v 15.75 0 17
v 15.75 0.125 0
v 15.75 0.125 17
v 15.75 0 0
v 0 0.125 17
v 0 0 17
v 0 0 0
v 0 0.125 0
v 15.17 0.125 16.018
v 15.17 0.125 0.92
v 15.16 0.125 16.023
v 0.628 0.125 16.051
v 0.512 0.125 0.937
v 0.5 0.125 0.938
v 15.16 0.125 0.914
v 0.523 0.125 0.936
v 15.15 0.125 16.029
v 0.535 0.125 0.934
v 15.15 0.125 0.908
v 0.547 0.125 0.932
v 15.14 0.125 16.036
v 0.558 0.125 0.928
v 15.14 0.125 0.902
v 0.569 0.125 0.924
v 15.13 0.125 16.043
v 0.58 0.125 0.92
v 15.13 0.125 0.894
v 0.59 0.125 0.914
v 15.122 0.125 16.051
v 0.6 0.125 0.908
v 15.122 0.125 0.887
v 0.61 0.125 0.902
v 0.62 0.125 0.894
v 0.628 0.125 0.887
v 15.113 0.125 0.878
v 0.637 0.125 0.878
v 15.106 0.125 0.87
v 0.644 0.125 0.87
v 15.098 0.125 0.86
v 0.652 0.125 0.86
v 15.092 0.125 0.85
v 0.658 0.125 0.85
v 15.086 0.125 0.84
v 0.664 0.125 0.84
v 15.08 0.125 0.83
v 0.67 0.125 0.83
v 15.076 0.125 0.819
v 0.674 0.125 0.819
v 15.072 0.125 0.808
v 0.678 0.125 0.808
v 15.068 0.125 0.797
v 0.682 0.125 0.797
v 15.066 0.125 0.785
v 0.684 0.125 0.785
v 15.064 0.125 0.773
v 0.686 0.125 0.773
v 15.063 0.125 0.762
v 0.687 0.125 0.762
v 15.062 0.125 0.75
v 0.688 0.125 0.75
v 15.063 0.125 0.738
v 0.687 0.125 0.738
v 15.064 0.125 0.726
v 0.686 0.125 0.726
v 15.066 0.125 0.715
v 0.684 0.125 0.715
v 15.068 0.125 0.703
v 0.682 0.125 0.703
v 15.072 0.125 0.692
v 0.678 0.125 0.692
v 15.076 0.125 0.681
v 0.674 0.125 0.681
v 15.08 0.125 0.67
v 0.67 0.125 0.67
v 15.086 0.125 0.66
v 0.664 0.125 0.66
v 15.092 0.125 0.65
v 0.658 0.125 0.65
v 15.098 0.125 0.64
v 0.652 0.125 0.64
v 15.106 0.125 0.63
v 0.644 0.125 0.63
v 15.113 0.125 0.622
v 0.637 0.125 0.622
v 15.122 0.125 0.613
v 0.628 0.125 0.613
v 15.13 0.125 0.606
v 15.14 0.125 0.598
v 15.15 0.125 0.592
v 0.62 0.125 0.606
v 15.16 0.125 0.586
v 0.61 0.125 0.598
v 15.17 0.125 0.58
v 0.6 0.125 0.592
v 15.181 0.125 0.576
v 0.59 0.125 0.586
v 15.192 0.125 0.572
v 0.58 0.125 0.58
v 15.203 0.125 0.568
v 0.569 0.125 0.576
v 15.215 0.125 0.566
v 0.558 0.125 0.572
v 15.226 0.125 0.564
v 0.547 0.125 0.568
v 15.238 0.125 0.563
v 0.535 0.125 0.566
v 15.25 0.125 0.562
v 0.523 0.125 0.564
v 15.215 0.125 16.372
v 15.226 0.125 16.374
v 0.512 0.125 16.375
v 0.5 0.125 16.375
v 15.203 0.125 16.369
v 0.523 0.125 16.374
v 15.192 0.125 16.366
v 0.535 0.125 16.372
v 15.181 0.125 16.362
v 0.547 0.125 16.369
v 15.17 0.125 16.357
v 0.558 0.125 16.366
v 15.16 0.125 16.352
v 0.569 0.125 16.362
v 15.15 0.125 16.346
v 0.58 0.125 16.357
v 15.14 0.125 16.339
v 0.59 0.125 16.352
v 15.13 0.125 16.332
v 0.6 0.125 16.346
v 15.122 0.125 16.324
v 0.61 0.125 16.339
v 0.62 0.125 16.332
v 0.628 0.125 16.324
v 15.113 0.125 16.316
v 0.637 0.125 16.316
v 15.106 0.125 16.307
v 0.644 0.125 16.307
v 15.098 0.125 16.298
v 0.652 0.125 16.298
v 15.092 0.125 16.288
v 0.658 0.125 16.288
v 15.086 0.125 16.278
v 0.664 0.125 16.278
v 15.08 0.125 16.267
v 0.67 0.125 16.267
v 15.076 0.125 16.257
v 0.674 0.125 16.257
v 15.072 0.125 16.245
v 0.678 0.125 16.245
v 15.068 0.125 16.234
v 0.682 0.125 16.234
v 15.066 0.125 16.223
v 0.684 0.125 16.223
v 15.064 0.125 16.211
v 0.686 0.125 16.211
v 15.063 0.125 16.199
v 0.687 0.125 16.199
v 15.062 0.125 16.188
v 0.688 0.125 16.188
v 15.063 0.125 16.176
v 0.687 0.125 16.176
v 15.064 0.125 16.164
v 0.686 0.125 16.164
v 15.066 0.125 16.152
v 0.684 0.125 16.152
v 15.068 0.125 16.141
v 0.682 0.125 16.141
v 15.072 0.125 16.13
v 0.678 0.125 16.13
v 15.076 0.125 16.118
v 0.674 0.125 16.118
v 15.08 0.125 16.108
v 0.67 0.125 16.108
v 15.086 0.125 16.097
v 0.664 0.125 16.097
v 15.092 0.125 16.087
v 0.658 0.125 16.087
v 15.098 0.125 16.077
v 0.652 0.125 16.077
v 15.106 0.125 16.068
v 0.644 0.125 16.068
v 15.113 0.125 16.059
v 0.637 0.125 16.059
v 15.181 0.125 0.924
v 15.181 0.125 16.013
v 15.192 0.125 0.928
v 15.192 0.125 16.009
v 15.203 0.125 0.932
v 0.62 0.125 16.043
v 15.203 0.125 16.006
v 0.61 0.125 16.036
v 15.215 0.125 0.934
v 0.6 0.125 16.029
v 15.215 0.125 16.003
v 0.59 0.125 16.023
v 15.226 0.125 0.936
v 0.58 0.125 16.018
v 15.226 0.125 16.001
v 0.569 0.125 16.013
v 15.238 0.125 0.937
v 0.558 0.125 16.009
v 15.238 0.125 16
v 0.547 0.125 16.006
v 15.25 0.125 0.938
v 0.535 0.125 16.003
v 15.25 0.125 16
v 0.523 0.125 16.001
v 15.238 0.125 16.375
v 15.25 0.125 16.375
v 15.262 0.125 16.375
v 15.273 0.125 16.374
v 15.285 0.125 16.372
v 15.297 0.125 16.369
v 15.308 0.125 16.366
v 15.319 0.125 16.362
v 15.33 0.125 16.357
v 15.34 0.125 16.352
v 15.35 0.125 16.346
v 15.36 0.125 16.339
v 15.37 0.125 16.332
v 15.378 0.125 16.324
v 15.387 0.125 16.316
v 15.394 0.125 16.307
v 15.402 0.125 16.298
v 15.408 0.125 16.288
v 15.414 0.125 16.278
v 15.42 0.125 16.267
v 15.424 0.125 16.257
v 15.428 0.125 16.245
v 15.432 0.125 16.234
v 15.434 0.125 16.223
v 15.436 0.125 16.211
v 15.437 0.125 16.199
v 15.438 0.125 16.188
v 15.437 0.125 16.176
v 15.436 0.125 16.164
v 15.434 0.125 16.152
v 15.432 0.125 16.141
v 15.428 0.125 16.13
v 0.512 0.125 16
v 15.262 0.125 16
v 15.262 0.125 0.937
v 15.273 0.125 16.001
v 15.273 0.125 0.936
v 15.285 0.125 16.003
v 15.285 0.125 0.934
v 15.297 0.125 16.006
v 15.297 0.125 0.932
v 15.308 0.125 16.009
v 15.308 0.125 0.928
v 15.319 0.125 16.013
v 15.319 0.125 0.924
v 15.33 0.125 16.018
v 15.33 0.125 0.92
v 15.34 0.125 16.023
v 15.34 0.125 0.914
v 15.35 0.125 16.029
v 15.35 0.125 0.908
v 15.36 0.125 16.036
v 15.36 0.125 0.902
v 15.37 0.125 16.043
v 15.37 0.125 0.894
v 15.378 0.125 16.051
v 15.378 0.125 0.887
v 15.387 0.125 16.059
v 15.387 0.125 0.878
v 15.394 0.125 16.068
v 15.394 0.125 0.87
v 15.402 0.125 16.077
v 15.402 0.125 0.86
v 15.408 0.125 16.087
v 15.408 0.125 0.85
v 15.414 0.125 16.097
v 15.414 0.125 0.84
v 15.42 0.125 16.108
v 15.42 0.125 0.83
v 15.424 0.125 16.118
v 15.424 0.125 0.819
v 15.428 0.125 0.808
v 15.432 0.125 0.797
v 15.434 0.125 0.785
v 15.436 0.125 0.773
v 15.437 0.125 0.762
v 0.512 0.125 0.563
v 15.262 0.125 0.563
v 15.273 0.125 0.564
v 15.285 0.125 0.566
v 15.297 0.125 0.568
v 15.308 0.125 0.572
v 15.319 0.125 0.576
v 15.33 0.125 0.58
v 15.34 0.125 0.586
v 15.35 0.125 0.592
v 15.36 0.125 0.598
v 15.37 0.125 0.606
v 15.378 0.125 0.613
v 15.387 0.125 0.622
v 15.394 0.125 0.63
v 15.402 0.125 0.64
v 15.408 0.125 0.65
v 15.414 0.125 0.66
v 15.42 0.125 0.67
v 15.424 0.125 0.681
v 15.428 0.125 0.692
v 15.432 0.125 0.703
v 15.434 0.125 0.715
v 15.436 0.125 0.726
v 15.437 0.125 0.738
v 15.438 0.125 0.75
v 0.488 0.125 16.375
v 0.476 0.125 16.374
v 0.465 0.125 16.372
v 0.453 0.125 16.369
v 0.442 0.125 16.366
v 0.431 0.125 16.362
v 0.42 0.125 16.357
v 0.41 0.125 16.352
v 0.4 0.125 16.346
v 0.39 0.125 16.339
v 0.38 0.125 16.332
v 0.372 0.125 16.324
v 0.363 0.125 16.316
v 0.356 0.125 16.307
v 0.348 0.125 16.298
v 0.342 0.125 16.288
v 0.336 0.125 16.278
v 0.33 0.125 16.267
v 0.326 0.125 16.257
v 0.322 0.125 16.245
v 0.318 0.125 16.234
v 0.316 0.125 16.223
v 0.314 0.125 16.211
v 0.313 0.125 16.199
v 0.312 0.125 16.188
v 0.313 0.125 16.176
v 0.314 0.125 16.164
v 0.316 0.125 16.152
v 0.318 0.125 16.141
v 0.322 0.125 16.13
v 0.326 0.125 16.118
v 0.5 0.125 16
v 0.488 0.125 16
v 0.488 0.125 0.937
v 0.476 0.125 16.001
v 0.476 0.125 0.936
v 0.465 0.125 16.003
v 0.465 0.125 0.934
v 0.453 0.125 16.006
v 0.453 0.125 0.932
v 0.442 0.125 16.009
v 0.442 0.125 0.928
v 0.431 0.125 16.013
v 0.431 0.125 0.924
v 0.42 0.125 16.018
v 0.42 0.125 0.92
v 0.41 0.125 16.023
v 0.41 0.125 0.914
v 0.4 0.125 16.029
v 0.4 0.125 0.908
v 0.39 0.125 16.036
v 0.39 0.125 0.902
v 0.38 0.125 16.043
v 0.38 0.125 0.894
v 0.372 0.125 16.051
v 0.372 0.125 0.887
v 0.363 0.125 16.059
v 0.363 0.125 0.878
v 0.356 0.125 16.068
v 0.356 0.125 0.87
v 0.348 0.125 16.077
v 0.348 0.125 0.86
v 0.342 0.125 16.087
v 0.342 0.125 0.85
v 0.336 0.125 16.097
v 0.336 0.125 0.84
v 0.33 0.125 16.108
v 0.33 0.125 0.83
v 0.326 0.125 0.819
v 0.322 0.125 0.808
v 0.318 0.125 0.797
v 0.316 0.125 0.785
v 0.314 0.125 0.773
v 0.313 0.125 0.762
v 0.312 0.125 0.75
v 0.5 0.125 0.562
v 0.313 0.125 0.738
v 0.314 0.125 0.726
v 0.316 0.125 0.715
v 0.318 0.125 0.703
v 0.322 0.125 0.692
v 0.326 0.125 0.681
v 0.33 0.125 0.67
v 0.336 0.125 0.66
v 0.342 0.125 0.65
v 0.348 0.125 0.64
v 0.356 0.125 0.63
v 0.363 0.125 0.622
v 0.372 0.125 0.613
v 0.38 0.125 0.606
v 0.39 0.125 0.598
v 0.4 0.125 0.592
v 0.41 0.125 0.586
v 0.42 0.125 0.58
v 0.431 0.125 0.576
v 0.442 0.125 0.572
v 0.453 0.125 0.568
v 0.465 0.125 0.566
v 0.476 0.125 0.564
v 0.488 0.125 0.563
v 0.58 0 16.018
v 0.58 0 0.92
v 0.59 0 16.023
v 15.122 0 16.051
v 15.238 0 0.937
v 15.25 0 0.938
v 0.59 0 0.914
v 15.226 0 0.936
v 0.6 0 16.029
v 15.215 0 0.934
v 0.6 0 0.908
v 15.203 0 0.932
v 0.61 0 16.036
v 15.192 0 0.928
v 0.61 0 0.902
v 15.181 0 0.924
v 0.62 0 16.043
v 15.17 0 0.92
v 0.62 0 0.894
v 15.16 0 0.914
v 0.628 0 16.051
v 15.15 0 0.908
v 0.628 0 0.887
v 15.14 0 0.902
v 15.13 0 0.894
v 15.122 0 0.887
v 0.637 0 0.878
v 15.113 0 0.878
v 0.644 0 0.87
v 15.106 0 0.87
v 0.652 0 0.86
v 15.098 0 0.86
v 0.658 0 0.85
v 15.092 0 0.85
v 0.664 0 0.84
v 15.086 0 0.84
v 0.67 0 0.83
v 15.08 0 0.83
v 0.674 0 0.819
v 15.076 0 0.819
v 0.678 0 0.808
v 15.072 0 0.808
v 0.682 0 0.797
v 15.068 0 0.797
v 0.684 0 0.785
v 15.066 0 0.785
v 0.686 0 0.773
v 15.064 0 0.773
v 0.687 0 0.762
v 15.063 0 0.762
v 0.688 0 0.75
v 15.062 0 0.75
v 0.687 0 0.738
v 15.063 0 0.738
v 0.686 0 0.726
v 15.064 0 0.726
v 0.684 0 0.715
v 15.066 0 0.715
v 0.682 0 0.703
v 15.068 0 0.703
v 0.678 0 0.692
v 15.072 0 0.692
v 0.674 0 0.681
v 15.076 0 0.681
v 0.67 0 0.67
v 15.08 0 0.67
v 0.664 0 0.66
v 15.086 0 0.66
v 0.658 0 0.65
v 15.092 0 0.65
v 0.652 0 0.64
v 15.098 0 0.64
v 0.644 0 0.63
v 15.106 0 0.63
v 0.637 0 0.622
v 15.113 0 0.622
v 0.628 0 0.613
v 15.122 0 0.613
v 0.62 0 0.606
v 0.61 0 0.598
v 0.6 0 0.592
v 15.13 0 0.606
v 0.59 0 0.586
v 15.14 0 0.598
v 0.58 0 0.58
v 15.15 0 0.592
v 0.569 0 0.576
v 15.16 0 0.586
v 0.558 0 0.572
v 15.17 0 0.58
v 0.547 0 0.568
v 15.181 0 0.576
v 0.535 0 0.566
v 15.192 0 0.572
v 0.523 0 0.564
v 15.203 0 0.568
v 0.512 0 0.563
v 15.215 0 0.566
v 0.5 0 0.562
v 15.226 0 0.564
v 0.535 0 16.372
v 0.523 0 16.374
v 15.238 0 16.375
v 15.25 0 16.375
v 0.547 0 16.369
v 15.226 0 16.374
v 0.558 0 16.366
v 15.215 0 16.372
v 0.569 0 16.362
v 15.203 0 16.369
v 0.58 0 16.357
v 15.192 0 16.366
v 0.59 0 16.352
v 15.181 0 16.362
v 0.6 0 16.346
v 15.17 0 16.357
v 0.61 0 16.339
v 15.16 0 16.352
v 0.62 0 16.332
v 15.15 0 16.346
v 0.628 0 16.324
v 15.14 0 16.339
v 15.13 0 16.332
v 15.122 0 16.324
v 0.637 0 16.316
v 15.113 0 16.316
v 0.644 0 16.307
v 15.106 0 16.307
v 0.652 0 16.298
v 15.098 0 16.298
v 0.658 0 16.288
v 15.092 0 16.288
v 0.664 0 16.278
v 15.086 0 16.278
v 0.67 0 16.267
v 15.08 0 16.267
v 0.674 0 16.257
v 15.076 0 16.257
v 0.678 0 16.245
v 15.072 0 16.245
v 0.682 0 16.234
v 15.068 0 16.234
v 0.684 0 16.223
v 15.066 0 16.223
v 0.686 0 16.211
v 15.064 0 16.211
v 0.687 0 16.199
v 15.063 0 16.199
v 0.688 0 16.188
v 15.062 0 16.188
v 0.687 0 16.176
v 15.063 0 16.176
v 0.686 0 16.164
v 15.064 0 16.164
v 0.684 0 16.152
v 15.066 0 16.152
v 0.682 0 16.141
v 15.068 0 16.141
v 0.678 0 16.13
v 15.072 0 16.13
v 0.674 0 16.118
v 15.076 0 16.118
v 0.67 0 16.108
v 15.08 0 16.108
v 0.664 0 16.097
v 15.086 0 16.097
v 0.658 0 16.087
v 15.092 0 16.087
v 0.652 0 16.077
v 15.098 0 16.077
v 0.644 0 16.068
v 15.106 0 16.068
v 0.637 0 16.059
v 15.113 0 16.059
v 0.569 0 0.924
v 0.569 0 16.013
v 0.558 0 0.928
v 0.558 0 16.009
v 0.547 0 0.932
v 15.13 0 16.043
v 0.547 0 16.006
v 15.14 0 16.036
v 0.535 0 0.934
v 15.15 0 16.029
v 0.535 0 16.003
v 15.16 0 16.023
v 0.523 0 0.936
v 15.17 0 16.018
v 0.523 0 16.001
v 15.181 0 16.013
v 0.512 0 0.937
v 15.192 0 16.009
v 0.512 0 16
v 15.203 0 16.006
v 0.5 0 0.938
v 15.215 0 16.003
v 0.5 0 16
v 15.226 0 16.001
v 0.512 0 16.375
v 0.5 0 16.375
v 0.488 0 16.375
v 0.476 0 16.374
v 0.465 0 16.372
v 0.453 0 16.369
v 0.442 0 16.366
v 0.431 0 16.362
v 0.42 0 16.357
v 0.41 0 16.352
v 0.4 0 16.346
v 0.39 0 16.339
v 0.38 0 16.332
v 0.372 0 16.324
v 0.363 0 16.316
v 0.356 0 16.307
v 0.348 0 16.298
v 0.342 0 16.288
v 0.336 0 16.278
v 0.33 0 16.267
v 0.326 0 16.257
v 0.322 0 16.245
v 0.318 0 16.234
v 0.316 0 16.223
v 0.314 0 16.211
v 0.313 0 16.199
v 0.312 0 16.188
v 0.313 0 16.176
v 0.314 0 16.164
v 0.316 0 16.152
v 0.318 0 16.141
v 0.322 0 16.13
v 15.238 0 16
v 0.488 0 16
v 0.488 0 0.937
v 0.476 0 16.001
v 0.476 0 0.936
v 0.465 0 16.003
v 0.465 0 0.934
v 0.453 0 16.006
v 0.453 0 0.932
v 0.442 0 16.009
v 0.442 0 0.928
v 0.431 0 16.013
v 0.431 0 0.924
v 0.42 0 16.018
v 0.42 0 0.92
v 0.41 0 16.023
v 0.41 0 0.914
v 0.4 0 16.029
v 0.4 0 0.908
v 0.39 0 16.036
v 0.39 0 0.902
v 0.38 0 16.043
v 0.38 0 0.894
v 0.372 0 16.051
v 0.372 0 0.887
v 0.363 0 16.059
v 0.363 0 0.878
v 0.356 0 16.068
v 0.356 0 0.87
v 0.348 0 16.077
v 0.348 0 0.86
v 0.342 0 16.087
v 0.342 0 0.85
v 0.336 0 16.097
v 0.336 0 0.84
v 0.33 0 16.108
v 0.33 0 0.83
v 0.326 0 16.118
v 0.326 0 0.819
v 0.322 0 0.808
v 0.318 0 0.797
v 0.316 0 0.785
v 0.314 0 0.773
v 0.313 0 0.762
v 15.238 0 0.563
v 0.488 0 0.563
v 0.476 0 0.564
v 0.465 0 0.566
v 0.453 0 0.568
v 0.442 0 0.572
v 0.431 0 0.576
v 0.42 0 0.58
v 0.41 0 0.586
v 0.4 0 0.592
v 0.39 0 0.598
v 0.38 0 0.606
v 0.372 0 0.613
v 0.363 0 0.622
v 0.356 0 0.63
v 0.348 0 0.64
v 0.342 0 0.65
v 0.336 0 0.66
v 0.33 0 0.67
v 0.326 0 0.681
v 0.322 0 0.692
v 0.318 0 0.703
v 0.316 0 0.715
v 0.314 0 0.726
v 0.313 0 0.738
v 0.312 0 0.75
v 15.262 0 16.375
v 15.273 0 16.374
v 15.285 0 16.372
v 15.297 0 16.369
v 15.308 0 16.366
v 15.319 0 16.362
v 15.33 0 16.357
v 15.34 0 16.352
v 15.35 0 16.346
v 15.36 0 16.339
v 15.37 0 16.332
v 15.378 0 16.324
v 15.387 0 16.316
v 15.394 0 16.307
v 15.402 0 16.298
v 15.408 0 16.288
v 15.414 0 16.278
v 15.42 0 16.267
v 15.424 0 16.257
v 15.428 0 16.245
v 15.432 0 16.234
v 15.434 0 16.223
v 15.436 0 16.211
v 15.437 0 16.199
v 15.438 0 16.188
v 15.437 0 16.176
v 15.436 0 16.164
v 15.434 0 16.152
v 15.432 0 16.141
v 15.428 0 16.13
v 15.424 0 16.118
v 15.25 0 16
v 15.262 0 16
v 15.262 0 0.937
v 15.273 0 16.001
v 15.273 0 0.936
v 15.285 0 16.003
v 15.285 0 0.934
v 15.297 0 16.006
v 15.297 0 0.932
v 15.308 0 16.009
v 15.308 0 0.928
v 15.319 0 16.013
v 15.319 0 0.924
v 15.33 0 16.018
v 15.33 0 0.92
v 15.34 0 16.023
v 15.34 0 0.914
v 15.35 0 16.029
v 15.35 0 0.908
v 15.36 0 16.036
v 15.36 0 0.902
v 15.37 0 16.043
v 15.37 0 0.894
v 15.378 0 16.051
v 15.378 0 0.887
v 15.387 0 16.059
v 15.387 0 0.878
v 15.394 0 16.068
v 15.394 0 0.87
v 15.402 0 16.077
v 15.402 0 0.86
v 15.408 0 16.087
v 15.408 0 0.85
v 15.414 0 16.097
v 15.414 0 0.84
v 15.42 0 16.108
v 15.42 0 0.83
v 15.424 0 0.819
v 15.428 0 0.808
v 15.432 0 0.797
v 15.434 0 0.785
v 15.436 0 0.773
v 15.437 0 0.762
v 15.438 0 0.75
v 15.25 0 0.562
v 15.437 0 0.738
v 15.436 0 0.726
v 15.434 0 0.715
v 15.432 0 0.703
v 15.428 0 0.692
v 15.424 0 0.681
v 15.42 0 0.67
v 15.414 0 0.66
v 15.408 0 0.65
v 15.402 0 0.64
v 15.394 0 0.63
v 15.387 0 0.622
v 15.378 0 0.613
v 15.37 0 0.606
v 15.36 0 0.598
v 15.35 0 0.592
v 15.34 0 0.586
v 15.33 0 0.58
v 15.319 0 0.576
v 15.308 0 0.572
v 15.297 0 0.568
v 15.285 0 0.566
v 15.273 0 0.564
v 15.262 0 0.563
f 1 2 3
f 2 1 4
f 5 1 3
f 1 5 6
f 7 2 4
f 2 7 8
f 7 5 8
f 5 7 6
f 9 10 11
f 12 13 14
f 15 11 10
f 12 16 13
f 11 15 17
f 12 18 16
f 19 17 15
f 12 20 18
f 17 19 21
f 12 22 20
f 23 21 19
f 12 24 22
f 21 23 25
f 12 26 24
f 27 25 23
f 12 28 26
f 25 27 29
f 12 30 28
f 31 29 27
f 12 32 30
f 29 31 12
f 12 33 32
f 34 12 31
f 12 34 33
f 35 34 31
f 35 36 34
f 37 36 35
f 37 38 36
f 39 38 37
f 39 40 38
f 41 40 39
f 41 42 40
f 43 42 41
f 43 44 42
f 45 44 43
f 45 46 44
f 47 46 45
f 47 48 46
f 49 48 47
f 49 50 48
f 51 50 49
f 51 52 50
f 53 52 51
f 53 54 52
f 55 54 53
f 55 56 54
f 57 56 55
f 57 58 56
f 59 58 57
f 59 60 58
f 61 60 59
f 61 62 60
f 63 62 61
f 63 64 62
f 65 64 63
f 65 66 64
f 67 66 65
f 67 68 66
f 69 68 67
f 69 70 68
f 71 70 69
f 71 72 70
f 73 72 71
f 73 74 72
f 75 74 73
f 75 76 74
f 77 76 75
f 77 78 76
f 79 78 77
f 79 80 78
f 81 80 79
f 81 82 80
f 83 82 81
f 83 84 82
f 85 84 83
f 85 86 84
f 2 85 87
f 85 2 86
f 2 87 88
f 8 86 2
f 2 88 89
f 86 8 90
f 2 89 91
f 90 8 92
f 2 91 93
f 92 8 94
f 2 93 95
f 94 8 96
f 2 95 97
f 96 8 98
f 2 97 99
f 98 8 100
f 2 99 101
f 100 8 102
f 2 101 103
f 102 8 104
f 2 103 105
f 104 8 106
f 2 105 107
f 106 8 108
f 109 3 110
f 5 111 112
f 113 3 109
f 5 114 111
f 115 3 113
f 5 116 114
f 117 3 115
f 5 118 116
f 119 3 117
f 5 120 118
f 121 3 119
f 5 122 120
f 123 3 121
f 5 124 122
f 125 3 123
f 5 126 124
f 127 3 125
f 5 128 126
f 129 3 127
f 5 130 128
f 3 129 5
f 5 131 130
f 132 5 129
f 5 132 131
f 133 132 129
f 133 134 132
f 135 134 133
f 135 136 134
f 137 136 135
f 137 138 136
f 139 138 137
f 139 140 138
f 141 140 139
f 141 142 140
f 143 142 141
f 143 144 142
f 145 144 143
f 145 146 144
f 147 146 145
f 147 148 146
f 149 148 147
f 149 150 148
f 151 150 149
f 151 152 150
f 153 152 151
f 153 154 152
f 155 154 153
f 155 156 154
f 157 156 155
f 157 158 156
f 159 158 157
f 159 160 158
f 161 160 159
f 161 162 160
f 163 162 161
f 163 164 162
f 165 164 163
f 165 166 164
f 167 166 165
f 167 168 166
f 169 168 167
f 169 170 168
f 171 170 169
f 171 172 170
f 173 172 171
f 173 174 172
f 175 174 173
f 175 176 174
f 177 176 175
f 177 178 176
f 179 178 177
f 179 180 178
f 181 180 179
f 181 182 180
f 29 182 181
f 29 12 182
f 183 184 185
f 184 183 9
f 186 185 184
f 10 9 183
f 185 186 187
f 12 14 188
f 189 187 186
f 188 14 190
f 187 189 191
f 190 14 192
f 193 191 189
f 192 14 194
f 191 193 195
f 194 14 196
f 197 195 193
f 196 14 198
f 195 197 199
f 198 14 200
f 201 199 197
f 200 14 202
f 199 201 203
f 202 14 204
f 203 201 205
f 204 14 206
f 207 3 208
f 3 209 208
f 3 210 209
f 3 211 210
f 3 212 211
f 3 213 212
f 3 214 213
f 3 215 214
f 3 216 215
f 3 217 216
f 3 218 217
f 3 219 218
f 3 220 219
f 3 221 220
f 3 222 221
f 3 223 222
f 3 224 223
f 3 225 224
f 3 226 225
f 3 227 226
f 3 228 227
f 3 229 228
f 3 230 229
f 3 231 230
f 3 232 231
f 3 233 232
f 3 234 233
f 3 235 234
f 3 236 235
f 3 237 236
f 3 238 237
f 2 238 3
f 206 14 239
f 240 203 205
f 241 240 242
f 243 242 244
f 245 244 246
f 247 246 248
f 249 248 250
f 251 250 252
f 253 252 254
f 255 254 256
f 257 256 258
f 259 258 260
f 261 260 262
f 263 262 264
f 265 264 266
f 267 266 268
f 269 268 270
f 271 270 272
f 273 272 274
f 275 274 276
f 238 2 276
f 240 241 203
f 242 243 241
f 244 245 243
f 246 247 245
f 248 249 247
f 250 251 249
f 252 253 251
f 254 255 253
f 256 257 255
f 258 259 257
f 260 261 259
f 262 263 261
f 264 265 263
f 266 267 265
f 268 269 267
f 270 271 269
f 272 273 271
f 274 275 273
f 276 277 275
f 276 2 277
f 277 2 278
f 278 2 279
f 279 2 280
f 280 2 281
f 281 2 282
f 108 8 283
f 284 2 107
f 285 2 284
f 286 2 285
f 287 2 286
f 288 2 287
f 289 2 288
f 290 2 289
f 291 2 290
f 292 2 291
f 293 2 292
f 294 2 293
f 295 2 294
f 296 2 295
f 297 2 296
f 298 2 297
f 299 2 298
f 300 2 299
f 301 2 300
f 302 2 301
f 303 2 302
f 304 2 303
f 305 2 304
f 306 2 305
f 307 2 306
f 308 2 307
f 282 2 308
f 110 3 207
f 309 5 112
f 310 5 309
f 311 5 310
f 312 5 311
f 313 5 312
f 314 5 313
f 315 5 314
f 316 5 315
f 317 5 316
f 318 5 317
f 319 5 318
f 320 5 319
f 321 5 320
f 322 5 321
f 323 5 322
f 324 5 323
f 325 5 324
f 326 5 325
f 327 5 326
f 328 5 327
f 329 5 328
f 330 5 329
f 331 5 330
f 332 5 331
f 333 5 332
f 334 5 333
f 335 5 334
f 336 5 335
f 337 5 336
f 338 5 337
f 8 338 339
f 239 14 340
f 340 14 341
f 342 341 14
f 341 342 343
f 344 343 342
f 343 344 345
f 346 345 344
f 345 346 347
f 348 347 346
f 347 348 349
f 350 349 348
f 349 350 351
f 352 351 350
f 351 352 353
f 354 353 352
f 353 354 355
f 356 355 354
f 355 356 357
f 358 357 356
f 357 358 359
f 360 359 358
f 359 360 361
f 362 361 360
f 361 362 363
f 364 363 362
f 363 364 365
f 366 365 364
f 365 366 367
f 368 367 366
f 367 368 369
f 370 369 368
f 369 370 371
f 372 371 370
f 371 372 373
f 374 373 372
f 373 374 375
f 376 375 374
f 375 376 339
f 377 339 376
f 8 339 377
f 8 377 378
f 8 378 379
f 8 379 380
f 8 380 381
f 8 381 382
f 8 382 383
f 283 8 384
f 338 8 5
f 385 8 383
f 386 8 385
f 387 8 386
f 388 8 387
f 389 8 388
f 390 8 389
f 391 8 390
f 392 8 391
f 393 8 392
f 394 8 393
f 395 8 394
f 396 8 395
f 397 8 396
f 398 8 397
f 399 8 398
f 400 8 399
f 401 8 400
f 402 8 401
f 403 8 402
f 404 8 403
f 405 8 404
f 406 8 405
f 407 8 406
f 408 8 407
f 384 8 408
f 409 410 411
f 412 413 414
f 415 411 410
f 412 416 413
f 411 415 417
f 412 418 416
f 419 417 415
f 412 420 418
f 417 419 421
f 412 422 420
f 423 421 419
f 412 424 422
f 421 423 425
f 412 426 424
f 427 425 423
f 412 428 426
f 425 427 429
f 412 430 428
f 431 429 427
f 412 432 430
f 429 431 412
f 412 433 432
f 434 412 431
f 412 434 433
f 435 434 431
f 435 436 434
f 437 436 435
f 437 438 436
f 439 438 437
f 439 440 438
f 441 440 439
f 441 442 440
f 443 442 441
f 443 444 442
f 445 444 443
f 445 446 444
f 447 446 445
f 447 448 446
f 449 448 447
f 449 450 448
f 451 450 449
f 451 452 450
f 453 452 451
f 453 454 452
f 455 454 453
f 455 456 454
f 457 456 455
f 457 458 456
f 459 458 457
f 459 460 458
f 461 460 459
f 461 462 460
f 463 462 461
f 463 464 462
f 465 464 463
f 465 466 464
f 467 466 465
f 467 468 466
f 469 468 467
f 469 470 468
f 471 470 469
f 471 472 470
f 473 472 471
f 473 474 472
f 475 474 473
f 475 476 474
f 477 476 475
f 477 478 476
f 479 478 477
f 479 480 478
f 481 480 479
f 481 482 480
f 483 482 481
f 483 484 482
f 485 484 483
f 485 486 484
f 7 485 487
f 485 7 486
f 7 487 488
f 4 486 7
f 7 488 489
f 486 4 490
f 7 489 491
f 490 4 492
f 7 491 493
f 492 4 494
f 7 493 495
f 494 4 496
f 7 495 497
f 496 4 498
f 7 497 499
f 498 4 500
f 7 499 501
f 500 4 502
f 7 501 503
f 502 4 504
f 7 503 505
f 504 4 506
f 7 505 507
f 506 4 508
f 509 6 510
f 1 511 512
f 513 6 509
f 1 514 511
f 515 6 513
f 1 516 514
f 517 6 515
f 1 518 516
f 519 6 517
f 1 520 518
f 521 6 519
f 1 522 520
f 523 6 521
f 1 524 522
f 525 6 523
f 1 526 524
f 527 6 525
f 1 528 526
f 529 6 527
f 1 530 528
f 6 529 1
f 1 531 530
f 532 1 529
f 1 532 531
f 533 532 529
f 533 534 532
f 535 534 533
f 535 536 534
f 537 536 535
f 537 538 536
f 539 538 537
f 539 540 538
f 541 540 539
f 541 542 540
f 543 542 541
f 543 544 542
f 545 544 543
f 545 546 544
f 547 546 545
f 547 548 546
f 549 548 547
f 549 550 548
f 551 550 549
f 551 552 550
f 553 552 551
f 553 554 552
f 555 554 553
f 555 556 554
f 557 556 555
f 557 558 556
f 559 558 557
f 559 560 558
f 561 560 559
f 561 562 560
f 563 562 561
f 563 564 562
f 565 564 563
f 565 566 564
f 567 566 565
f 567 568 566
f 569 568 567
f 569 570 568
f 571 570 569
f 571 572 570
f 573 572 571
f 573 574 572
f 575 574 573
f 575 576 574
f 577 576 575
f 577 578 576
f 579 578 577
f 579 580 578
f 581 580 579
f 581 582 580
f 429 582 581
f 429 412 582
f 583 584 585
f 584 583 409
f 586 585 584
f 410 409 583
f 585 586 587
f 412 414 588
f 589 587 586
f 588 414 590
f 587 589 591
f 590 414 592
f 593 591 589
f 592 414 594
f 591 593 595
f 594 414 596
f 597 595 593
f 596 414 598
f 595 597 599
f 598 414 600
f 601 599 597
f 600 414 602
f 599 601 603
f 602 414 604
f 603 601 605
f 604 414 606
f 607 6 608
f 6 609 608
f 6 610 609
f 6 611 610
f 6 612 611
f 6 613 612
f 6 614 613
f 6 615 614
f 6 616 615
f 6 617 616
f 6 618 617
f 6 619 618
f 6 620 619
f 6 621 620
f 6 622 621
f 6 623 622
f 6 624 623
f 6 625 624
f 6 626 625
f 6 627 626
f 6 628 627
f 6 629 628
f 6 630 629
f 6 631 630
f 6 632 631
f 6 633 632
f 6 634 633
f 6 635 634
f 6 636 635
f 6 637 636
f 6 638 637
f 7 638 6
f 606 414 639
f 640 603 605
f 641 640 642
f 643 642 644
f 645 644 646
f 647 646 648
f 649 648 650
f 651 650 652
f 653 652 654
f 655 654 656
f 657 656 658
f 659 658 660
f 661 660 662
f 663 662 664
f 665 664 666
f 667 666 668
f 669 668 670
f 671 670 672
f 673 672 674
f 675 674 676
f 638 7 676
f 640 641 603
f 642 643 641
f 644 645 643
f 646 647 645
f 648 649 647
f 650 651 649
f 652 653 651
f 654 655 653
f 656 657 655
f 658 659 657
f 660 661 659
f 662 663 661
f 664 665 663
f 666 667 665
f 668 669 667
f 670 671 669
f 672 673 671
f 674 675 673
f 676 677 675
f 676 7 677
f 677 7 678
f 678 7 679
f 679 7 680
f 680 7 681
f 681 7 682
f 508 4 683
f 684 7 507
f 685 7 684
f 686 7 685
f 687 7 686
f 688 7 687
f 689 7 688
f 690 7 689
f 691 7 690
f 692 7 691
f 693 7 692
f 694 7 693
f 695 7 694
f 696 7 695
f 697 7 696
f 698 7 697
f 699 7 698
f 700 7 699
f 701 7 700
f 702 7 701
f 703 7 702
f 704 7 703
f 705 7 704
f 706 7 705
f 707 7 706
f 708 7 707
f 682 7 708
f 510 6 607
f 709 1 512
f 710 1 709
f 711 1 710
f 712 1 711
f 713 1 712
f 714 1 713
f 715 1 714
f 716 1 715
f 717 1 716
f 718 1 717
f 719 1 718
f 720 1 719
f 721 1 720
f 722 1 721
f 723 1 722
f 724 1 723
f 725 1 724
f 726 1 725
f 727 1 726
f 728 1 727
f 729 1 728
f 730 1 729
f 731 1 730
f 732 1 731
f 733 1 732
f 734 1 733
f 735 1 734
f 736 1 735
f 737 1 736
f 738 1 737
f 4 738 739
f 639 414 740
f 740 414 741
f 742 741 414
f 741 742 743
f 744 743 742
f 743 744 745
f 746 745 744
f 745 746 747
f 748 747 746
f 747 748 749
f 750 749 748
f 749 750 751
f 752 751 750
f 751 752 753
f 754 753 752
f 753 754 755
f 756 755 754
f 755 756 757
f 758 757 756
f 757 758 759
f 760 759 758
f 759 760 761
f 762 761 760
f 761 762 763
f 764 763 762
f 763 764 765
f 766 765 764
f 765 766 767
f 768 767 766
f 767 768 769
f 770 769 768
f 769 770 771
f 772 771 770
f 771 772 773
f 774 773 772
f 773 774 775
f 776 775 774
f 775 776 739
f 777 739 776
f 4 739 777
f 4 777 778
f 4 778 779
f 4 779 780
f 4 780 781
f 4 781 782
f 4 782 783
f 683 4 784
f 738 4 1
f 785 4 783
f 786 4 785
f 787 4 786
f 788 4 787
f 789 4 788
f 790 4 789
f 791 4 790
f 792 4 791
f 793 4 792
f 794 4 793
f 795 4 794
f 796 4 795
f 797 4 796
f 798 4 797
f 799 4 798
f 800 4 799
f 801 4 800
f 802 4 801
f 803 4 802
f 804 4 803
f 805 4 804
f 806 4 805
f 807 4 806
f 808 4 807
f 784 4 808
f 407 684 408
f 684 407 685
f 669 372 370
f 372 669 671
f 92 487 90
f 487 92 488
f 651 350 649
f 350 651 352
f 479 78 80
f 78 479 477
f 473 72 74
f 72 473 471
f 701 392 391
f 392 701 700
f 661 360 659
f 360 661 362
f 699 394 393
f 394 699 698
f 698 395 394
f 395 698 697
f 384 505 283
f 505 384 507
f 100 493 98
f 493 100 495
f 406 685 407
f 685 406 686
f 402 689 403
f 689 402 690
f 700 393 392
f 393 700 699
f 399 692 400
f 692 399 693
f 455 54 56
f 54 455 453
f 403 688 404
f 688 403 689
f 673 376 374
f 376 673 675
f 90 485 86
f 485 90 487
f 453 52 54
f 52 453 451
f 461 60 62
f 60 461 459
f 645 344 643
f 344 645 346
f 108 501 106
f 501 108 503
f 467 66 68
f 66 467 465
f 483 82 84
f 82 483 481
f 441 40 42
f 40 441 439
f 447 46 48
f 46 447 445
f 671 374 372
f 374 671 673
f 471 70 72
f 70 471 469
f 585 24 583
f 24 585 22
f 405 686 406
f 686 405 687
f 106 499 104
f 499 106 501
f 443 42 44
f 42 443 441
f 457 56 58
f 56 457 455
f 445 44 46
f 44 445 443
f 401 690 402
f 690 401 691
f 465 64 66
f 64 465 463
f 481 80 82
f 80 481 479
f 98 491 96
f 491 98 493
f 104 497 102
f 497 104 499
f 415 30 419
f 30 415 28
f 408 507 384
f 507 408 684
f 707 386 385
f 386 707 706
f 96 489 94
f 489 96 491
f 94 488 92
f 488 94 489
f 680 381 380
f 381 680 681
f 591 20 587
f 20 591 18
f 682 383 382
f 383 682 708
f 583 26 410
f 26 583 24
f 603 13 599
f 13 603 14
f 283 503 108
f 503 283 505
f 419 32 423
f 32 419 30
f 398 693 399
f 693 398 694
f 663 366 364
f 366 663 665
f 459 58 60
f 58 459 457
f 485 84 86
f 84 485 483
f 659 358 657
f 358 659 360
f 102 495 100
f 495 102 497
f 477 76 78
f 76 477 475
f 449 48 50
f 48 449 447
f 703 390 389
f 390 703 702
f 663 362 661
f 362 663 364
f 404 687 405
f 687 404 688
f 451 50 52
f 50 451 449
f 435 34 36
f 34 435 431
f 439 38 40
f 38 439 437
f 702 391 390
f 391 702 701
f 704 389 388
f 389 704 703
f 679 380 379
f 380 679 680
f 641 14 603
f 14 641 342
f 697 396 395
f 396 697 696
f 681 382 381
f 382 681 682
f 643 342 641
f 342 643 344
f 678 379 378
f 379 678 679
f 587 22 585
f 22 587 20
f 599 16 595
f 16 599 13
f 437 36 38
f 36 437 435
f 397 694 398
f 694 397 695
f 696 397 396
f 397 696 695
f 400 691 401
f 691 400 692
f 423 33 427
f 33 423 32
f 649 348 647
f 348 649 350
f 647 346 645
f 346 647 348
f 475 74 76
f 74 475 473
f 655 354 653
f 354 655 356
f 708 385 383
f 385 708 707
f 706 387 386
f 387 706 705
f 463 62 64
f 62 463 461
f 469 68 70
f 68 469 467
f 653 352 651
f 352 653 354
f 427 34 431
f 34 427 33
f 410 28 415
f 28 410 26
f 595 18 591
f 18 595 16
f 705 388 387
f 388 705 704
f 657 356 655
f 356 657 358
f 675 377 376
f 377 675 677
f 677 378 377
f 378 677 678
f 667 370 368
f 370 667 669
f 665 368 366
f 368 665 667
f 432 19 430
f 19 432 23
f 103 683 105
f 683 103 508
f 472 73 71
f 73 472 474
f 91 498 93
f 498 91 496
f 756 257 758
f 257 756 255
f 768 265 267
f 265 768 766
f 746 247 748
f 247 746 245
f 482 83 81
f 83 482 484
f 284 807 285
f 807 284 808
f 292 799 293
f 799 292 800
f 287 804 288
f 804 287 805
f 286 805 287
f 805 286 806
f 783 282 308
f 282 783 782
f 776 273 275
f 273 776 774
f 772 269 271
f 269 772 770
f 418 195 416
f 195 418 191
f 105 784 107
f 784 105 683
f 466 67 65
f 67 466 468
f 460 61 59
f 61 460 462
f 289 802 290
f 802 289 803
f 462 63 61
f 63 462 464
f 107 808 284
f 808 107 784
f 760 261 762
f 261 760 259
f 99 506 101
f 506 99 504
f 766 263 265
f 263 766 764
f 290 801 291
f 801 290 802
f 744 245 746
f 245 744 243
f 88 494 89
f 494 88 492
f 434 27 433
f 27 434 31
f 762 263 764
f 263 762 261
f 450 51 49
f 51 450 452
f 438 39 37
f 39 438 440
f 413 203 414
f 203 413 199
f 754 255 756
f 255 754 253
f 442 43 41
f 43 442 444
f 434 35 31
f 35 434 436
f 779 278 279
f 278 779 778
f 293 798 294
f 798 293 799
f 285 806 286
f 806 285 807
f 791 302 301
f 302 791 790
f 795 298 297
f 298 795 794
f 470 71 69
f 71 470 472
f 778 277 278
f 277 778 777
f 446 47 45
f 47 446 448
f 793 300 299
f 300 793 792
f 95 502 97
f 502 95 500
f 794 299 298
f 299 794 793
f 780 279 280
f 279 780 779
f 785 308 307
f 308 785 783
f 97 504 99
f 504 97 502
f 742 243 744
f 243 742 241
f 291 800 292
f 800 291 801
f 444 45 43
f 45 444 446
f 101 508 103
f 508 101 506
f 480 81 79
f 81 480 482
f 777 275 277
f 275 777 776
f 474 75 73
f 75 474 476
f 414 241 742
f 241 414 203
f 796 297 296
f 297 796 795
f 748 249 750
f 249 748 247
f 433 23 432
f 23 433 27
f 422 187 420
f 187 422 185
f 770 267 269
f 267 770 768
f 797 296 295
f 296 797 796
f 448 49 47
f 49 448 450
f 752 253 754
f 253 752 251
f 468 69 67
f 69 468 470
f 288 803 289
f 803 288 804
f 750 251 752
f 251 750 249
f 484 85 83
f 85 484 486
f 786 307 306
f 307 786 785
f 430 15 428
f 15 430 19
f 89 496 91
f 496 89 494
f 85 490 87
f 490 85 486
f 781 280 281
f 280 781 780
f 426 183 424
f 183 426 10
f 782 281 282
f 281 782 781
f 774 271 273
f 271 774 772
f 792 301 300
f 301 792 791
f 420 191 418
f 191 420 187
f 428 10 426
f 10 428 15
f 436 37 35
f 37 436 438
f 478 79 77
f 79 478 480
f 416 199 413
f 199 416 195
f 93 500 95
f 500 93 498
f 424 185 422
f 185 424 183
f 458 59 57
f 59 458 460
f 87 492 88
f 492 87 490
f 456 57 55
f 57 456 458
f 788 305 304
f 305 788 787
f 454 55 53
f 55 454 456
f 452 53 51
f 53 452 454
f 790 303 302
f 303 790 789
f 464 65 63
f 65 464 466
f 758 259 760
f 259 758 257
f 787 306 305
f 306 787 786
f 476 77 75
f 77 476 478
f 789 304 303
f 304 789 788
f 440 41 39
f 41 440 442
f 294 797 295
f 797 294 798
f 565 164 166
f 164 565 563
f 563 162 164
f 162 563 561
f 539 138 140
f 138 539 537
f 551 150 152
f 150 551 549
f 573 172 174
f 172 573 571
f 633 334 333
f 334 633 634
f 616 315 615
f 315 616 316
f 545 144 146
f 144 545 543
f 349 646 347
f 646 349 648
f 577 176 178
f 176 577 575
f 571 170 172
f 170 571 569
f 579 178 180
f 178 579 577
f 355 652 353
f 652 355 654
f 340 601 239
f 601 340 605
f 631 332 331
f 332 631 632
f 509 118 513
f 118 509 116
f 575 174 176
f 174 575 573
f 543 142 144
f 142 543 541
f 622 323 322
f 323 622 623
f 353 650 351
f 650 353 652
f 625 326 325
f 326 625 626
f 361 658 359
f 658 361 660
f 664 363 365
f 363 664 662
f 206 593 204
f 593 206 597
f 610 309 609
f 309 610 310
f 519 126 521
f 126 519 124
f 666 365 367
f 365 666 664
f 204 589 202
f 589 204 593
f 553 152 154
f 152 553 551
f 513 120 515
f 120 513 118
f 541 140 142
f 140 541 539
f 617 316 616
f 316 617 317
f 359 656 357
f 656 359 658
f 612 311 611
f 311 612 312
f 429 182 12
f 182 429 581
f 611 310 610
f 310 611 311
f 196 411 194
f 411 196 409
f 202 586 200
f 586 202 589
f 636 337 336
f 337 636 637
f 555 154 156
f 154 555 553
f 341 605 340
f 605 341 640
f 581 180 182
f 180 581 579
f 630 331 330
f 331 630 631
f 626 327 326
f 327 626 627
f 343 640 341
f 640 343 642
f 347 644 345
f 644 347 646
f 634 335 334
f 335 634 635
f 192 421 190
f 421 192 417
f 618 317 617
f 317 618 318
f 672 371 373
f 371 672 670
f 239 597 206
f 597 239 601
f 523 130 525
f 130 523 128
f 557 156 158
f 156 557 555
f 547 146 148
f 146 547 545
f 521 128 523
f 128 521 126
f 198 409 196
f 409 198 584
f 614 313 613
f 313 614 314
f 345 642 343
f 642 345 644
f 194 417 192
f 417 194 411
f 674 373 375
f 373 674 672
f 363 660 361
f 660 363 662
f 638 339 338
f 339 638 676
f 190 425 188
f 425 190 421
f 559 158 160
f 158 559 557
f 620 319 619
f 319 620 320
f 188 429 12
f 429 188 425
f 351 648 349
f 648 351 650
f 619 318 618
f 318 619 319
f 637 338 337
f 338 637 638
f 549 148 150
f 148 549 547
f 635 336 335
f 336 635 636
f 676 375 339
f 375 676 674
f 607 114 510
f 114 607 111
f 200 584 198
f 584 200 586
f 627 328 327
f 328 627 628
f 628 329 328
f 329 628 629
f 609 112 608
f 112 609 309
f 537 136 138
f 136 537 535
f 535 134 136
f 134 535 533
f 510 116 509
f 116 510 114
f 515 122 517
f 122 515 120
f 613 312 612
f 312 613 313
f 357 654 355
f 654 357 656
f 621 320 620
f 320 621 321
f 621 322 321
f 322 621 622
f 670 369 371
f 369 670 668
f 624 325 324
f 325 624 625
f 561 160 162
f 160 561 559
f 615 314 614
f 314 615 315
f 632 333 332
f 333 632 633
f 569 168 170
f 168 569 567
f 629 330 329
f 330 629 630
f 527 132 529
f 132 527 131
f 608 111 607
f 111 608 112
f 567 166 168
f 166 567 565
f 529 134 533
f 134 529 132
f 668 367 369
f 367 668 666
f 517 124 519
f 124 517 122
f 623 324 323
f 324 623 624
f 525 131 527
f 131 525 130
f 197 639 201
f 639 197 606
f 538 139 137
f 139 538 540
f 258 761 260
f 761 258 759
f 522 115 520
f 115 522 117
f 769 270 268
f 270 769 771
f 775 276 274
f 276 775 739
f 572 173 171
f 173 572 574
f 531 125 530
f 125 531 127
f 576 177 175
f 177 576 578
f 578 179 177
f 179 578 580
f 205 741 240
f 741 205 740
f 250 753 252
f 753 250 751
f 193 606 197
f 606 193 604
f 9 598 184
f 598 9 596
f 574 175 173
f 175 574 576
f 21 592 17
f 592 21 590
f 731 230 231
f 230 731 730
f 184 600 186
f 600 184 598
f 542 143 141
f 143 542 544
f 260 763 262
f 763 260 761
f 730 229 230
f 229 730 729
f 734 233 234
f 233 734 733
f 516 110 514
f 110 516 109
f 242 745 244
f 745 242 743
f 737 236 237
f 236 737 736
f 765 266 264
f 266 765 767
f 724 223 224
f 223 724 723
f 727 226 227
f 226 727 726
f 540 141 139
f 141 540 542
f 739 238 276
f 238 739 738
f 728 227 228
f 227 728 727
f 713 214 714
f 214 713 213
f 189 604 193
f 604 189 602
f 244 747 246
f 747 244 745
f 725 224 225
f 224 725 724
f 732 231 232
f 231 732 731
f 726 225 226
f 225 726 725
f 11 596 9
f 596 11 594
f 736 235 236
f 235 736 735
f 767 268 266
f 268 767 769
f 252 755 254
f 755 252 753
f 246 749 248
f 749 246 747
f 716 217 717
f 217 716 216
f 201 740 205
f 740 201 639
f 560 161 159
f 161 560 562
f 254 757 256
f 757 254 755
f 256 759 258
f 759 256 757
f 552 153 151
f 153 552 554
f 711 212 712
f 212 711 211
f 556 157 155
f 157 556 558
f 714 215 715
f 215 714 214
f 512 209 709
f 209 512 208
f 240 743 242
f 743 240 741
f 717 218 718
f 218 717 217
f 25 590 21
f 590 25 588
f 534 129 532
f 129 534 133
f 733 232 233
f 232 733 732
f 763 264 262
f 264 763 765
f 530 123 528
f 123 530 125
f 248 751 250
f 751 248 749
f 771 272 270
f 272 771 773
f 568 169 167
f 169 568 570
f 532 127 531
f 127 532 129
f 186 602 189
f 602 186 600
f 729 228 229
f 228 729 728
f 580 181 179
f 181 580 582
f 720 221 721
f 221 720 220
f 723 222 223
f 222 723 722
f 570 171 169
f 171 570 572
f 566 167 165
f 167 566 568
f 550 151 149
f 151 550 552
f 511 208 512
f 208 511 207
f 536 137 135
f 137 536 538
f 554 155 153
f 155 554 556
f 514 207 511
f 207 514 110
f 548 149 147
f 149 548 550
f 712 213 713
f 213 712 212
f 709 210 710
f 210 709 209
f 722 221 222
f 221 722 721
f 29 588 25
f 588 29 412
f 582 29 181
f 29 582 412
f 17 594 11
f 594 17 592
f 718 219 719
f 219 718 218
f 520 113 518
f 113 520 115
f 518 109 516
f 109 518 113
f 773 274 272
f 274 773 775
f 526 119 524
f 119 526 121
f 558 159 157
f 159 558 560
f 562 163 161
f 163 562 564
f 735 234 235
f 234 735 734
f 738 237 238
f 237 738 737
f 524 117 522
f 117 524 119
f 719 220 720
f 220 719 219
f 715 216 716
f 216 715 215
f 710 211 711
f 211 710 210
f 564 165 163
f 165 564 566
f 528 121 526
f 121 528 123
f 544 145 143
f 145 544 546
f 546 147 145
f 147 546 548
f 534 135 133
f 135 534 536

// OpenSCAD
//Globals
$fn=100;
Opacity=0.4;

//Tempered glass sheet
width=15.75;
height=17;
thickness=0.125;
module Plate(){color("slategray",Opacity)cube([width,thickness,height]);}
module Hole(){color("slategray",Opacity)translate([0,1,0])rotate([90,0,0])cylinder(h=2,r=.375/2);}

delWidth=14.75;
delHeight=15.4375;
dx=(15.75-delWidth)/2;
dz=(17-15.5)/2;

difference(){
translate([0,0,0])Plate();
translate([dx,0,dz])rotate([0,90,0])Hole();
translate([dx+delWidth,0,dz])rotate([0,90,0])Hole();
translate([dx,0,dz+delHeight])rotate([0,90,0])Hole();
translate([dx+delWidth,0,dz+delHeight])rotate([0,90,0])Hole();
}
 
